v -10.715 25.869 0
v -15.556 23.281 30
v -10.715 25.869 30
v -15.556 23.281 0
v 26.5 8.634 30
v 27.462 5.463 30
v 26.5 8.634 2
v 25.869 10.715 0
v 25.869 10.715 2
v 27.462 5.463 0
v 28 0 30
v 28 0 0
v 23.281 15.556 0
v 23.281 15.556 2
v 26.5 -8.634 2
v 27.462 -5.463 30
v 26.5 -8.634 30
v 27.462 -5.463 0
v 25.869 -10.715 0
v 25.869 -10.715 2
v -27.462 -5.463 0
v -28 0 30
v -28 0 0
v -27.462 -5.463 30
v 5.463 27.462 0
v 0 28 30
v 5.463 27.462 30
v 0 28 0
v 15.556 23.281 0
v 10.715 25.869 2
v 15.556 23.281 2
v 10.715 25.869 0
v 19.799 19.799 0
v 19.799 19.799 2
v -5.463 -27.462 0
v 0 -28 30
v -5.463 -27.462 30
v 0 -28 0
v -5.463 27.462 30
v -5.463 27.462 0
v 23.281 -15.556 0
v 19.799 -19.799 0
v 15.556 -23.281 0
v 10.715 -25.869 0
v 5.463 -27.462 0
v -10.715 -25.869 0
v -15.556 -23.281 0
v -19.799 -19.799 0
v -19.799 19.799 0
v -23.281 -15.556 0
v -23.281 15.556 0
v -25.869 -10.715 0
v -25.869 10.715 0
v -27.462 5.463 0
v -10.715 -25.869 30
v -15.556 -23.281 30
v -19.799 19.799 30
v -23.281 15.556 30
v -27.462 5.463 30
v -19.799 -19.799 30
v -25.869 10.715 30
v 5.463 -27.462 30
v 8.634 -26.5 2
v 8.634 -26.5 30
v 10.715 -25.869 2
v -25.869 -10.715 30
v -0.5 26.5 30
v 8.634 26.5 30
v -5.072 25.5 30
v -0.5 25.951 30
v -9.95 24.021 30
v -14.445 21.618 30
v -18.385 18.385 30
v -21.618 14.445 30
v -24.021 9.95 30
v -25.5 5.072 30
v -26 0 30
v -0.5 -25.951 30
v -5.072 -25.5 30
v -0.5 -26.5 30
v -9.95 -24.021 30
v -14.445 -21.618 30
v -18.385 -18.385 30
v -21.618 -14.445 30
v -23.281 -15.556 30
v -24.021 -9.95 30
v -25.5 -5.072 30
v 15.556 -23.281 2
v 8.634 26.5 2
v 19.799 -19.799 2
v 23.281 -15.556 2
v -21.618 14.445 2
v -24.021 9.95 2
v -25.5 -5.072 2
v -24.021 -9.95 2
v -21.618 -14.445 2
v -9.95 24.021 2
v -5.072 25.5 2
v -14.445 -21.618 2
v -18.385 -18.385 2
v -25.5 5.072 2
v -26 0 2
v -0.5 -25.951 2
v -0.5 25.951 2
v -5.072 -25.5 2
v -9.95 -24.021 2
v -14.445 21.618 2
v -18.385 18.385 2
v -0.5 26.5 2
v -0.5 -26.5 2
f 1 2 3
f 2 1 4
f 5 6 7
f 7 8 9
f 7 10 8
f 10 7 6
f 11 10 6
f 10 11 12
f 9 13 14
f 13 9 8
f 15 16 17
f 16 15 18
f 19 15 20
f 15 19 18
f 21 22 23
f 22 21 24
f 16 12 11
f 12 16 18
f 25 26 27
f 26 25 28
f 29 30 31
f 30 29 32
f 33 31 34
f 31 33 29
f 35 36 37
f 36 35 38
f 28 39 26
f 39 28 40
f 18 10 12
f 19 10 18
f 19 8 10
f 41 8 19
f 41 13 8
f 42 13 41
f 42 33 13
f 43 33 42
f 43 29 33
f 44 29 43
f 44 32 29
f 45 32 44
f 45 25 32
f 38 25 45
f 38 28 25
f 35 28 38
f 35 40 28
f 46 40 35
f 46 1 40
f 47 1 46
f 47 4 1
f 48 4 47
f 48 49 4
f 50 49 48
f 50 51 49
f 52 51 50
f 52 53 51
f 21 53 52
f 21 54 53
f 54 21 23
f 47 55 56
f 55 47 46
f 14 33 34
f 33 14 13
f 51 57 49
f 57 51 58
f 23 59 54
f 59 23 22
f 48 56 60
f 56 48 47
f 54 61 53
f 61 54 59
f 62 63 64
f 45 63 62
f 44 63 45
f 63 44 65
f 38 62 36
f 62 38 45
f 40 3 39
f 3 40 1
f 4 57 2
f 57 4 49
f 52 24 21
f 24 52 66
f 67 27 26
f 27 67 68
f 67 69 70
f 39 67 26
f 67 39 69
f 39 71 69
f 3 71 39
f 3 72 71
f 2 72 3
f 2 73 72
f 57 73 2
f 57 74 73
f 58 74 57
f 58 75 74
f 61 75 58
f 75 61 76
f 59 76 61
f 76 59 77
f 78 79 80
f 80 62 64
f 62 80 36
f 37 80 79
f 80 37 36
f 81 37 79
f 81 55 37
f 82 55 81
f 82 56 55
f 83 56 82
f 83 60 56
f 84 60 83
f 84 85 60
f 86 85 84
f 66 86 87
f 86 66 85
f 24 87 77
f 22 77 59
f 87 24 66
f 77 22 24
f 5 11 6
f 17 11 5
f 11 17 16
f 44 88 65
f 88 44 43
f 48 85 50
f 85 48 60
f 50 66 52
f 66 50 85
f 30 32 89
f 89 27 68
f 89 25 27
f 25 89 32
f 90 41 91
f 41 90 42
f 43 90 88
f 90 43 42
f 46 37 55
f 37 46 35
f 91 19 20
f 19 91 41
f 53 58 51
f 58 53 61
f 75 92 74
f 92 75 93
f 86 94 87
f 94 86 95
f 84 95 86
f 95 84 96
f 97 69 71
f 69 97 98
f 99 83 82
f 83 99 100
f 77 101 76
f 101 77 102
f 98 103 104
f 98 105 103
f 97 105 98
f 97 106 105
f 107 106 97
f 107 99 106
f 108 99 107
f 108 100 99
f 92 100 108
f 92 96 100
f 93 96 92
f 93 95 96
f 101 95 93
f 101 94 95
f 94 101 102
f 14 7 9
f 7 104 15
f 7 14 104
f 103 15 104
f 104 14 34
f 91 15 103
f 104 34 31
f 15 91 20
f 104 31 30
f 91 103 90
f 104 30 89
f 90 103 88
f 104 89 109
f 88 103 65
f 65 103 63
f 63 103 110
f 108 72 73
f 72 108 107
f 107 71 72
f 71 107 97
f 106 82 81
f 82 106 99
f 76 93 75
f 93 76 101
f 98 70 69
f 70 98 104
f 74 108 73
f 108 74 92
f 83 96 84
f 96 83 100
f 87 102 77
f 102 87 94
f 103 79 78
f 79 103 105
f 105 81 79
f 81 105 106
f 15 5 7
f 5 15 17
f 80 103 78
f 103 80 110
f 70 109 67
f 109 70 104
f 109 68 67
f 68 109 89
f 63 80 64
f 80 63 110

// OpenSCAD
// file: consts.scad
// ============================================================
// SHARED CONSTANTS
// Description: Constants used by multiple parts in [PROJECT_NAME]
// ============================================================

// ============================================================
// WIDGET DIMENSIONS
// ============================================================
// Example: If your project holds/fits a specific object,
// define its dimensions here

// Widget dimensions (example - replace with your actual object)
WIDGET_DIAMETER = 50;
WIDGET_HEIGHT = 20;

// ============================================================
// CALCULATED DIMENSIONS
// ============================================================
// Dimensions derived from base constants and tolerances

// Slot/holder sizing with clearance
SLOT_WIDTH = WIDGET_DIAMETER + 2;      // 2mm total clearance
SLOT_HEIGHT = WIDGET_HEIGHT + 1;       // 1mm clearance

// Spacing between elements
ELEMENT_SPACING = WIDGET_DIAMETER + 10;  // 10mm gap between widgets

// ============================================================
// EXAMPLE USAGE
// ============================================================
// In your part files:
//   include <consts.scad>
//   cylinder(d = WIDGET_DIAMETER + TOLERANCE, h = WIDGET_HEIGHT);
// file: ../config.scad
// ============================================================
// PROJECT CONFIGURATION
// Description: Global settings for [PROJECT_NAME]
// ============================================================

// ============================================================
// RENDERING SETTINGS
// ============================================================

// Preview quality (lower = faster preview)
PREVIEW_FN = 32;

// Export quality (higher = smoother STL)
EXPORT_FN = 128;

// Current mode (set to true when exporting STL)
// Override from command line: openscad -D 'EXPORT_MODE=true' ...
EXPORT_MODE = false;

// Convenience variable - automatically use correct quality
$fn = EXPORT_MODE ? EXPORT_FN : PREVIEW_FN;

// ============================================================
// PROJECT DIMENSIONS
// ============================================================

// Base dimensions (millimeters)
BASE_WIDTH = 100;
BASE_DEPTH = 60;
BASE_HEIGHT = 30;

// Material settings
WALL_THICKNESS = 2;
FLOOR_THICKNESS = 3;

// Hardware
MOUNTING_HOLE_DIAMETER = 5;
MOUNTING_HOLE_SPACING = 80;

// ============================================================
// TOLERANCES
// ============================================================

// General fit tolerance (for sliding parts)
TOLERANCE = 0.2;

// Tight fit (press-fit, requires force)
TIGHT_FIT = 0.1;

// Loose fit (easy sliding, clearance)
LOOSE_FIT = 0.5;

// 3D printer compensation (add to holes, subtract from pegs)
PRINTER_TOLERANCE = 0.15;

// ============================================================
// FEATURE FLAGS
// ============================================================

// Enable experimental features
ENABLE_ADVANCED_FEATURES = false;

// Include support structures in export
INCLUDE_SUPPORTS = false;

// Show reference geometry in previews
SHOW_REFERENCE = true;

// ============================================================
// RENDERING HELPERS
// ============================================================

// Helper function to determine if we're in preview mode
function is_preview() = !EXPORT_MODE;

// Helper function to determine if we're in export mode
function is_export() = EXPORT_MODE;
// main file
// ============================================================
// PART: Part Two
// Description: Holder/mount component for [PROJECT_NAME]
// ============================================================

include <../config.scad>
include <consts.scad>

// ============================================================
// PART MODULE
// ============================================================

// Module: part_two()
// Usage:
//   part_two();
//   part_two(height, wall);
// Description:
//   Creates a holder/mount component with a slot
// Arguments:
//   height = Overall height of the holder. Default: BASE_HEIGHT
//   wall = Wall thickness. Default: WALL_THICKNESS
// Example(3D): Standard holder
//   part_two();
// Example(3D): Taller holder with thicker walls
//   part_two(height=50, wall=3);
module part_two(
    height = BASE_HEIGHT,
    wall = WALL_THICKNESS
) {
    difference() {
        // Main body - cylinder or rounded rectangle
        translate([0, 0, height/2])
            cylinder(
                d = SLOT_WIDTH + wall * 2,
                h = height,
                center = true
            );

        // Slot for widget
        translate([0, 0, wall])
            cylinder(
                d = SLOT_WIDTH,
                h = height,
                center = false
            );

        // Side opening for insertion
        translate([SLOT_WIDTH/4, 0, height/2 + wall])
            cube([
                SLOT_WIDTH/2 + 1,
                SLOT_WIDTH + 1,
                height
            ], center = true);
    }
}

// ============================================================
// RENDER
// ============================================================

// Render this part when file is opened directly
part_two();
